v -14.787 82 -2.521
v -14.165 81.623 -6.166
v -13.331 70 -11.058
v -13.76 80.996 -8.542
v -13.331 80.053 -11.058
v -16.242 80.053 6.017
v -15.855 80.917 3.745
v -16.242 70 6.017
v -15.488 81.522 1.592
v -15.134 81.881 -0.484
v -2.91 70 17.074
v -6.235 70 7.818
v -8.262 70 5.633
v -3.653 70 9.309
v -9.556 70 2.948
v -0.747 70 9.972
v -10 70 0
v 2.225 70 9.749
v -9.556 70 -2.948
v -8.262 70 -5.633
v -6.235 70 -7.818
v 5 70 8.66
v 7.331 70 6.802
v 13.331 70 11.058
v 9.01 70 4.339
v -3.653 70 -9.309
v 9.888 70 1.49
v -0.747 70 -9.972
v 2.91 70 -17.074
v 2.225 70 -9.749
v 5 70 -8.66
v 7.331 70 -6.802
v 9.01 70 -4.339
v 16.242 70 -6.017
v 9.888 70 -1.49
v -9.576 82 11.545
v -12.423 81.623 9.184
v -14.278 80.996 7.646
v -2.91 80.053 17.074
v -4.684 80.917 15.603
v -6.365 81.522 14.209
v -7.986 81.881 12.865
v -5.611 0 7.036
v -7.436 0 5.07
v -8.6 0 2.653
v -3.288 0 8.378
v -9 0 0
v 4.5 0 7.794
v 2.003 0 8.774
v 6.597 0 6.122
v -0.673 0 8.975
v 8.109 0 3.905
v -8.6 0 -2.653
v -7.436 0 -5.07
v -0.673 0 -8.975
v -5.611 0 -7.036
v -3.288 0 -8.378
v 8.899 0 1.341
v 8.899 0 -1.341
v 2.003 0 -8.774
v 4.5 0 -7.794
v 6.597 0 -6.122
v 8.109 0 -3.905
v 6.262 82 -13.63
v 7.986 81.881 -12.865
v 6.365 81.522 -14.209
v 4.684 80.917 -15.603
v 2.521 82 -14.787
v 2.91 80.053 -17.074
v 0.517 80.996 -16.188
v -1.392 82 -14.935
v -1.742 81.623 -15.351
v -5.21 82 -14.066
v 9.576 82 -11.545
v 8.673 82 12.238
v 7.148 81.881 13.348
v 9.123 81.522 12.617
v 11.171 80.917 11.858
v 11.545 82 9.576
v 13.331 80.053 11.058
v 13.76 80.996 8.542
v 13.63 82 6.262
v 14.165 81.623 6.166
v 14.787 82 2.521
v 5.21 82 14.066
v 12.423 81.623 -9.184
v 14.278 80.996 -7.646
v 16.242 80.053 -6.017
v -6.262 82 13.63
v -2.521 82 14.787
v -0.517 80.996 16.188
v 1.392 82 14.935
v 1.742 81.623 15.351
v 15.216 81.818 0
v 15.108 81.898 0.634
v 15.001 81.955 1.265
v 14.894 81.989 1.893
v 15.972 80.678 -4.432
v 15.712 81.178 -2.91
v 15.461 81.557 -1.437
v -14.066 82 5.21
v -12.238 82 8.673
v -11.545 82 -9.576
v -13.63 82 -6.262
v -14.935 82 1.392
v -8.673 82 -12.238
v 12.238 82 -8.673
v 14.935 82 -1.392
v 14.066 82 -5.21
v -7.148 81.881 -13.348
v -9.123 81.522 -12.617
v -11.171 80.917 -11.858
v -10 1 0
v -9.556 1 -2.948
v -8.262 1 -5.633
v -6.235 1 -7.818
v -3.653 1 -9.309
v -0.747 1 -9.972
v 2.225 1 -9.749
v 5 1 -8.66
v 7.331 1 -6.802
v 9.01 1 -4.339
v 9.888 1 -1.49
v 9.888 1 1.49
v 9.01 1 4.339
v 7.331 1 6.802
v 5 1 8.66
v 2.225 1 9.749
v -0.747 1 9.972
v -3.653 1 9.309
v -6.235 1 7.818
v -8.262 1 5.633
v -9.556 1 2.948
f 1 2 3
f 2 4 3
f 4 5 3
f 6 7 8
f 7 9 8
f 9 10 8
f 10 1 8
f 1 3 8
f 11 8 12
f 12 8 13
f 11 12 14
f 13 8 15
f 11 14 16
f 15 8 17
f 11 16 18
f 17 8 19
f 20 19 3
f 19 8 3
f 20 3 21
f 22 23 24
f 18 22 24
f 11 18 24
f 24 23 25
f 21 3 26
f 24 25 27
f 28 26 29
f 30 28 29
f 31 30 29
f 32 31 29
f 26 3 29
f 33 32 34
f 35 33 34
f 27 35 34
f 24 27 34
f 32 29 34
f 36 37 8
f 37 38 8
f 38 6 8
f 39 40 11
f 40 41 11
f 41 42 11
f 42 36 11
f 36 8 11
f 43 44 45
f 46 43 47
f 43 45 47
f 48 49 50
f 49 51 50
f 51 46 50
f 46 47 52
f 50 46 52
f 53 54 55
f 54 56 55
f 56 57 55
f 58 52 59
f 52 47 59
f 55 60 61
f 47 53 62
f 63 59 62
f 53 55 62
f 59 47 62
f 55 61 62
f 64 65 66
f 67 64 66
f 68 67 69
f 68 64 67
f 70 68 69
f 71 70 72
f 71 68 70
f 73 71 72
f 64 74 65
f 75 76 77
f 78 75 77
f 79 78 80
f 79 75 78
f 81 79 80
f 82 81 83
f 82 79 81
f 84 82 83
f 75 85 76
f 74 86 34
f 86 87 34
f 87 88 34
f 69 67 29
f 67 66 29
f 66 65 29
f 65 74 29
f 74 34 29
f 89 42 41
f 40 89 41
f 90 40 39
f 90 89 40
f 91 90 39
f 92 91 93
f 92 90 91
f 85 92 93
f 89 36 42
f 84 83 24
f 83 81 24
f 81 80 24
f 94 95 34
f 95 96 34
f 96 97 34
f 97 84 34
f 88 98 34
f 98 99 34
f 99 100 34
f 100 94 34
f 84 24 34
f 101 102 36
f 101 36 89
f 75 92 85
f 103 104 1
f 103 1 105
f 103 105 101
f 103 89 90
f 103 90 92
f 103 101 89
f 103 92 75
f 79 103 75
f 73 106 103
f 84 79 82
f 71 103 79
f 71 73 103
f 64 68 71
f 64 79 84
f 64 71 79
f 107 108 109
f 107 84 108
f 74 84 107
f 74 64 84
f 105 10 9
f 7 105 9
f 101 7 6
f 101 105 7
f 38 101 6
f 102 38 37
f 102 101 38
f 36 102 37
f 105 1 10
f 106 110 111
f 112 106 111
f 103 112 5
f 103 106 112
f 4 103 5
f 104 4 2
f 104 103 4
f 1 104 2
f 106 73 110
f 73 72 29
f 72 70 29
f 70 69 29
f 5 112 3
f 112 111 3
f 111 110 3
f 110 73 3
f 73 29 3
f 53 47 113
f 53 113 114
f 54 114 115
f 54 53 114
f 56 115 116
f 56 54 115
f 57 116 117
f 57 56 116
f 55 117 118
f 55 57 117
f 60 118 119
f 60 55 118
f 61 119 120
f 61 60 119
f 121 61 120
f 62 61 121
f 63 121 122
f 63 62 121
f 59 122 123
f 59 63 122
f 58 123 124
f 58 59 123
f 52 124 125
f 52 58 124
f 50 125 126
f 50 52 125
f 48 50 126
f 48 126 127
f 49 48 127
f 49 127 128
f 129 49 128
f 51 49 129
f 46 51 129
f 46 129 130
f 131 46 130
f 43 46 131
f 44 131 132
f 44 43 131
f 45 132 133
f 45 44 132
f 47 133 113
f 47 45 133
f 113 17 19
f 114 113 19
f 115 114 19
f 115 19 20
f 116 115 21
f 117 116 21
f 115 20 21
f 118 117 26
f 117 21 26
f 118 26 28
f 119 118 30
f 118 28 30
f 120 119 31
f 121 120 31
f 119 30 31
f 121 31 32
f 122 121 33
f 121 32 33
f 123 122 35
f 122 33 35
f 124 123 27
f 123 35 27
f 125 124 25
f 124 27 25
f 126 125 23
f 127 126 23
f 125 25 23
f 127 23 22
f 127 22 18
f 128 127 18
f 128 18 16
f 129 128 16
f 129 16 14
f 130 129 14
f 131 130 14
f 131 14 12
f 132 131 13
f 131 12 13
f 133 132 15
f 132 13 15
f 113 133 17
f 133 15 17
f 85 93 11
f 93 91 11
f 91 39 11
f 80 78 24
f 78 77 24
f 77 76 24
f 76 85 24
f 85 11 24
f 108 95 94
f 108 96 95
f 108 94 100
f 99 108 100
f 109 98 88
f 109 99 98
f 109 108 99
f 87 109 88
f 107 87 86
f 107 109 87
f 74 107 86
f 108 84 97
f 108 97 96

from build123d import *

# Parameters (mm, degrees)
SKETCH1_W           = 10
SKETCH1_H           = 70
BOSS_EXTRUDE1_DEPTH = 12
SKETCH3_OUTSIDE_W   = 60.55
SKETCH3_OUTSIDE_H   = 62.214
SKETCH3_OUTSIDE_R   = 15
CUT_EXTRUDE1_DEPTH  = 3
CUT_EXTRUDE1_DRAFT  = -50
CHAMFER1_SIZE       = 1


with BuildPart() as part:
    # Sketch1 → Revolve1 (revolve)
    with BuildSketch(Plane.XY):
        with Locations((5, 35)):
            Rectangle(SKETCH1_W, SKETCH1_H)
    revolve(axis=Axis((0, 70, 0), (0, -1, 0)))

    # Sketch2 → Boss-Extrude1 (add)
    with BuildSketch(Plane(origin=(0, 70, 0), x_dir=(1, 0, 0), z_dir=(0, 1, 0))):
        Polygon((13.331465099, -11.057668756), (16.241954599, 6.016553068), (2.9104895, 17.074221823), (-13.331465099, 11.057668756), (-16.241954599, -6.016553068), (-2.9104895, -17.074221823), align=None)
    extrude(amount=BOSS_EXTRUDE1_DEPTH)


with BuildPart() as cut_extrude1_tool:
    # Sketch3 outside → Cut-Extrude1 (with draft: the straight prism first)
    with BuildSketch(Plane(origin=(0, 82, 0), x_dir=(1, 0, 0), z_dir=(0, 1, 0))):
        Rectangle(SKETCH3_OUTSIDE_W, SKETCH3_OUTSIDE_H)
        Circle(SKETCH3_OUTSIDE_R, mode=Mode.SUBTRACT)
    extrude(amount=-CUT_EXTRUDE1_DEPTH)
    # Cut-Extrude1: the draft: its side faces are tilted about the plane it starts from
    cut_extrude1_sides = [cut_extrude1_tool.faces().sort_by_distance(p)[0] for p in [
        (0, 80.5, 31.107),
        (30.275, 80.5, 0),
        (0, 80.5, -31.107),
        (-30.275, 80.5, 0),
        (-15, 80.5, 0),
    ]]
    draft(cut_extrude1_sides, Plane(origin=(0, 82, 0), x_dir=(1, 0, 0), z_dir=(0, 1, 0)), CUT_EXTRUDE1_DRAFT)


with BuildPart() as part_1:
    add(part.part)

    # Cut-Extrude1: cut by cut_extrude1_tool
    add(cut_extrude1_tool.part, mode=Mode.SUBTRACT)

    # Chamfer1
    chamfer1_edges = [part_1.edges().sort_by_distance(p)[0] for p in [
        (-10, 0, 0),
    ]]
    chamfer(chamfer1_edges, length=CHAMFER1_SIZE)


solid = part_1.part
